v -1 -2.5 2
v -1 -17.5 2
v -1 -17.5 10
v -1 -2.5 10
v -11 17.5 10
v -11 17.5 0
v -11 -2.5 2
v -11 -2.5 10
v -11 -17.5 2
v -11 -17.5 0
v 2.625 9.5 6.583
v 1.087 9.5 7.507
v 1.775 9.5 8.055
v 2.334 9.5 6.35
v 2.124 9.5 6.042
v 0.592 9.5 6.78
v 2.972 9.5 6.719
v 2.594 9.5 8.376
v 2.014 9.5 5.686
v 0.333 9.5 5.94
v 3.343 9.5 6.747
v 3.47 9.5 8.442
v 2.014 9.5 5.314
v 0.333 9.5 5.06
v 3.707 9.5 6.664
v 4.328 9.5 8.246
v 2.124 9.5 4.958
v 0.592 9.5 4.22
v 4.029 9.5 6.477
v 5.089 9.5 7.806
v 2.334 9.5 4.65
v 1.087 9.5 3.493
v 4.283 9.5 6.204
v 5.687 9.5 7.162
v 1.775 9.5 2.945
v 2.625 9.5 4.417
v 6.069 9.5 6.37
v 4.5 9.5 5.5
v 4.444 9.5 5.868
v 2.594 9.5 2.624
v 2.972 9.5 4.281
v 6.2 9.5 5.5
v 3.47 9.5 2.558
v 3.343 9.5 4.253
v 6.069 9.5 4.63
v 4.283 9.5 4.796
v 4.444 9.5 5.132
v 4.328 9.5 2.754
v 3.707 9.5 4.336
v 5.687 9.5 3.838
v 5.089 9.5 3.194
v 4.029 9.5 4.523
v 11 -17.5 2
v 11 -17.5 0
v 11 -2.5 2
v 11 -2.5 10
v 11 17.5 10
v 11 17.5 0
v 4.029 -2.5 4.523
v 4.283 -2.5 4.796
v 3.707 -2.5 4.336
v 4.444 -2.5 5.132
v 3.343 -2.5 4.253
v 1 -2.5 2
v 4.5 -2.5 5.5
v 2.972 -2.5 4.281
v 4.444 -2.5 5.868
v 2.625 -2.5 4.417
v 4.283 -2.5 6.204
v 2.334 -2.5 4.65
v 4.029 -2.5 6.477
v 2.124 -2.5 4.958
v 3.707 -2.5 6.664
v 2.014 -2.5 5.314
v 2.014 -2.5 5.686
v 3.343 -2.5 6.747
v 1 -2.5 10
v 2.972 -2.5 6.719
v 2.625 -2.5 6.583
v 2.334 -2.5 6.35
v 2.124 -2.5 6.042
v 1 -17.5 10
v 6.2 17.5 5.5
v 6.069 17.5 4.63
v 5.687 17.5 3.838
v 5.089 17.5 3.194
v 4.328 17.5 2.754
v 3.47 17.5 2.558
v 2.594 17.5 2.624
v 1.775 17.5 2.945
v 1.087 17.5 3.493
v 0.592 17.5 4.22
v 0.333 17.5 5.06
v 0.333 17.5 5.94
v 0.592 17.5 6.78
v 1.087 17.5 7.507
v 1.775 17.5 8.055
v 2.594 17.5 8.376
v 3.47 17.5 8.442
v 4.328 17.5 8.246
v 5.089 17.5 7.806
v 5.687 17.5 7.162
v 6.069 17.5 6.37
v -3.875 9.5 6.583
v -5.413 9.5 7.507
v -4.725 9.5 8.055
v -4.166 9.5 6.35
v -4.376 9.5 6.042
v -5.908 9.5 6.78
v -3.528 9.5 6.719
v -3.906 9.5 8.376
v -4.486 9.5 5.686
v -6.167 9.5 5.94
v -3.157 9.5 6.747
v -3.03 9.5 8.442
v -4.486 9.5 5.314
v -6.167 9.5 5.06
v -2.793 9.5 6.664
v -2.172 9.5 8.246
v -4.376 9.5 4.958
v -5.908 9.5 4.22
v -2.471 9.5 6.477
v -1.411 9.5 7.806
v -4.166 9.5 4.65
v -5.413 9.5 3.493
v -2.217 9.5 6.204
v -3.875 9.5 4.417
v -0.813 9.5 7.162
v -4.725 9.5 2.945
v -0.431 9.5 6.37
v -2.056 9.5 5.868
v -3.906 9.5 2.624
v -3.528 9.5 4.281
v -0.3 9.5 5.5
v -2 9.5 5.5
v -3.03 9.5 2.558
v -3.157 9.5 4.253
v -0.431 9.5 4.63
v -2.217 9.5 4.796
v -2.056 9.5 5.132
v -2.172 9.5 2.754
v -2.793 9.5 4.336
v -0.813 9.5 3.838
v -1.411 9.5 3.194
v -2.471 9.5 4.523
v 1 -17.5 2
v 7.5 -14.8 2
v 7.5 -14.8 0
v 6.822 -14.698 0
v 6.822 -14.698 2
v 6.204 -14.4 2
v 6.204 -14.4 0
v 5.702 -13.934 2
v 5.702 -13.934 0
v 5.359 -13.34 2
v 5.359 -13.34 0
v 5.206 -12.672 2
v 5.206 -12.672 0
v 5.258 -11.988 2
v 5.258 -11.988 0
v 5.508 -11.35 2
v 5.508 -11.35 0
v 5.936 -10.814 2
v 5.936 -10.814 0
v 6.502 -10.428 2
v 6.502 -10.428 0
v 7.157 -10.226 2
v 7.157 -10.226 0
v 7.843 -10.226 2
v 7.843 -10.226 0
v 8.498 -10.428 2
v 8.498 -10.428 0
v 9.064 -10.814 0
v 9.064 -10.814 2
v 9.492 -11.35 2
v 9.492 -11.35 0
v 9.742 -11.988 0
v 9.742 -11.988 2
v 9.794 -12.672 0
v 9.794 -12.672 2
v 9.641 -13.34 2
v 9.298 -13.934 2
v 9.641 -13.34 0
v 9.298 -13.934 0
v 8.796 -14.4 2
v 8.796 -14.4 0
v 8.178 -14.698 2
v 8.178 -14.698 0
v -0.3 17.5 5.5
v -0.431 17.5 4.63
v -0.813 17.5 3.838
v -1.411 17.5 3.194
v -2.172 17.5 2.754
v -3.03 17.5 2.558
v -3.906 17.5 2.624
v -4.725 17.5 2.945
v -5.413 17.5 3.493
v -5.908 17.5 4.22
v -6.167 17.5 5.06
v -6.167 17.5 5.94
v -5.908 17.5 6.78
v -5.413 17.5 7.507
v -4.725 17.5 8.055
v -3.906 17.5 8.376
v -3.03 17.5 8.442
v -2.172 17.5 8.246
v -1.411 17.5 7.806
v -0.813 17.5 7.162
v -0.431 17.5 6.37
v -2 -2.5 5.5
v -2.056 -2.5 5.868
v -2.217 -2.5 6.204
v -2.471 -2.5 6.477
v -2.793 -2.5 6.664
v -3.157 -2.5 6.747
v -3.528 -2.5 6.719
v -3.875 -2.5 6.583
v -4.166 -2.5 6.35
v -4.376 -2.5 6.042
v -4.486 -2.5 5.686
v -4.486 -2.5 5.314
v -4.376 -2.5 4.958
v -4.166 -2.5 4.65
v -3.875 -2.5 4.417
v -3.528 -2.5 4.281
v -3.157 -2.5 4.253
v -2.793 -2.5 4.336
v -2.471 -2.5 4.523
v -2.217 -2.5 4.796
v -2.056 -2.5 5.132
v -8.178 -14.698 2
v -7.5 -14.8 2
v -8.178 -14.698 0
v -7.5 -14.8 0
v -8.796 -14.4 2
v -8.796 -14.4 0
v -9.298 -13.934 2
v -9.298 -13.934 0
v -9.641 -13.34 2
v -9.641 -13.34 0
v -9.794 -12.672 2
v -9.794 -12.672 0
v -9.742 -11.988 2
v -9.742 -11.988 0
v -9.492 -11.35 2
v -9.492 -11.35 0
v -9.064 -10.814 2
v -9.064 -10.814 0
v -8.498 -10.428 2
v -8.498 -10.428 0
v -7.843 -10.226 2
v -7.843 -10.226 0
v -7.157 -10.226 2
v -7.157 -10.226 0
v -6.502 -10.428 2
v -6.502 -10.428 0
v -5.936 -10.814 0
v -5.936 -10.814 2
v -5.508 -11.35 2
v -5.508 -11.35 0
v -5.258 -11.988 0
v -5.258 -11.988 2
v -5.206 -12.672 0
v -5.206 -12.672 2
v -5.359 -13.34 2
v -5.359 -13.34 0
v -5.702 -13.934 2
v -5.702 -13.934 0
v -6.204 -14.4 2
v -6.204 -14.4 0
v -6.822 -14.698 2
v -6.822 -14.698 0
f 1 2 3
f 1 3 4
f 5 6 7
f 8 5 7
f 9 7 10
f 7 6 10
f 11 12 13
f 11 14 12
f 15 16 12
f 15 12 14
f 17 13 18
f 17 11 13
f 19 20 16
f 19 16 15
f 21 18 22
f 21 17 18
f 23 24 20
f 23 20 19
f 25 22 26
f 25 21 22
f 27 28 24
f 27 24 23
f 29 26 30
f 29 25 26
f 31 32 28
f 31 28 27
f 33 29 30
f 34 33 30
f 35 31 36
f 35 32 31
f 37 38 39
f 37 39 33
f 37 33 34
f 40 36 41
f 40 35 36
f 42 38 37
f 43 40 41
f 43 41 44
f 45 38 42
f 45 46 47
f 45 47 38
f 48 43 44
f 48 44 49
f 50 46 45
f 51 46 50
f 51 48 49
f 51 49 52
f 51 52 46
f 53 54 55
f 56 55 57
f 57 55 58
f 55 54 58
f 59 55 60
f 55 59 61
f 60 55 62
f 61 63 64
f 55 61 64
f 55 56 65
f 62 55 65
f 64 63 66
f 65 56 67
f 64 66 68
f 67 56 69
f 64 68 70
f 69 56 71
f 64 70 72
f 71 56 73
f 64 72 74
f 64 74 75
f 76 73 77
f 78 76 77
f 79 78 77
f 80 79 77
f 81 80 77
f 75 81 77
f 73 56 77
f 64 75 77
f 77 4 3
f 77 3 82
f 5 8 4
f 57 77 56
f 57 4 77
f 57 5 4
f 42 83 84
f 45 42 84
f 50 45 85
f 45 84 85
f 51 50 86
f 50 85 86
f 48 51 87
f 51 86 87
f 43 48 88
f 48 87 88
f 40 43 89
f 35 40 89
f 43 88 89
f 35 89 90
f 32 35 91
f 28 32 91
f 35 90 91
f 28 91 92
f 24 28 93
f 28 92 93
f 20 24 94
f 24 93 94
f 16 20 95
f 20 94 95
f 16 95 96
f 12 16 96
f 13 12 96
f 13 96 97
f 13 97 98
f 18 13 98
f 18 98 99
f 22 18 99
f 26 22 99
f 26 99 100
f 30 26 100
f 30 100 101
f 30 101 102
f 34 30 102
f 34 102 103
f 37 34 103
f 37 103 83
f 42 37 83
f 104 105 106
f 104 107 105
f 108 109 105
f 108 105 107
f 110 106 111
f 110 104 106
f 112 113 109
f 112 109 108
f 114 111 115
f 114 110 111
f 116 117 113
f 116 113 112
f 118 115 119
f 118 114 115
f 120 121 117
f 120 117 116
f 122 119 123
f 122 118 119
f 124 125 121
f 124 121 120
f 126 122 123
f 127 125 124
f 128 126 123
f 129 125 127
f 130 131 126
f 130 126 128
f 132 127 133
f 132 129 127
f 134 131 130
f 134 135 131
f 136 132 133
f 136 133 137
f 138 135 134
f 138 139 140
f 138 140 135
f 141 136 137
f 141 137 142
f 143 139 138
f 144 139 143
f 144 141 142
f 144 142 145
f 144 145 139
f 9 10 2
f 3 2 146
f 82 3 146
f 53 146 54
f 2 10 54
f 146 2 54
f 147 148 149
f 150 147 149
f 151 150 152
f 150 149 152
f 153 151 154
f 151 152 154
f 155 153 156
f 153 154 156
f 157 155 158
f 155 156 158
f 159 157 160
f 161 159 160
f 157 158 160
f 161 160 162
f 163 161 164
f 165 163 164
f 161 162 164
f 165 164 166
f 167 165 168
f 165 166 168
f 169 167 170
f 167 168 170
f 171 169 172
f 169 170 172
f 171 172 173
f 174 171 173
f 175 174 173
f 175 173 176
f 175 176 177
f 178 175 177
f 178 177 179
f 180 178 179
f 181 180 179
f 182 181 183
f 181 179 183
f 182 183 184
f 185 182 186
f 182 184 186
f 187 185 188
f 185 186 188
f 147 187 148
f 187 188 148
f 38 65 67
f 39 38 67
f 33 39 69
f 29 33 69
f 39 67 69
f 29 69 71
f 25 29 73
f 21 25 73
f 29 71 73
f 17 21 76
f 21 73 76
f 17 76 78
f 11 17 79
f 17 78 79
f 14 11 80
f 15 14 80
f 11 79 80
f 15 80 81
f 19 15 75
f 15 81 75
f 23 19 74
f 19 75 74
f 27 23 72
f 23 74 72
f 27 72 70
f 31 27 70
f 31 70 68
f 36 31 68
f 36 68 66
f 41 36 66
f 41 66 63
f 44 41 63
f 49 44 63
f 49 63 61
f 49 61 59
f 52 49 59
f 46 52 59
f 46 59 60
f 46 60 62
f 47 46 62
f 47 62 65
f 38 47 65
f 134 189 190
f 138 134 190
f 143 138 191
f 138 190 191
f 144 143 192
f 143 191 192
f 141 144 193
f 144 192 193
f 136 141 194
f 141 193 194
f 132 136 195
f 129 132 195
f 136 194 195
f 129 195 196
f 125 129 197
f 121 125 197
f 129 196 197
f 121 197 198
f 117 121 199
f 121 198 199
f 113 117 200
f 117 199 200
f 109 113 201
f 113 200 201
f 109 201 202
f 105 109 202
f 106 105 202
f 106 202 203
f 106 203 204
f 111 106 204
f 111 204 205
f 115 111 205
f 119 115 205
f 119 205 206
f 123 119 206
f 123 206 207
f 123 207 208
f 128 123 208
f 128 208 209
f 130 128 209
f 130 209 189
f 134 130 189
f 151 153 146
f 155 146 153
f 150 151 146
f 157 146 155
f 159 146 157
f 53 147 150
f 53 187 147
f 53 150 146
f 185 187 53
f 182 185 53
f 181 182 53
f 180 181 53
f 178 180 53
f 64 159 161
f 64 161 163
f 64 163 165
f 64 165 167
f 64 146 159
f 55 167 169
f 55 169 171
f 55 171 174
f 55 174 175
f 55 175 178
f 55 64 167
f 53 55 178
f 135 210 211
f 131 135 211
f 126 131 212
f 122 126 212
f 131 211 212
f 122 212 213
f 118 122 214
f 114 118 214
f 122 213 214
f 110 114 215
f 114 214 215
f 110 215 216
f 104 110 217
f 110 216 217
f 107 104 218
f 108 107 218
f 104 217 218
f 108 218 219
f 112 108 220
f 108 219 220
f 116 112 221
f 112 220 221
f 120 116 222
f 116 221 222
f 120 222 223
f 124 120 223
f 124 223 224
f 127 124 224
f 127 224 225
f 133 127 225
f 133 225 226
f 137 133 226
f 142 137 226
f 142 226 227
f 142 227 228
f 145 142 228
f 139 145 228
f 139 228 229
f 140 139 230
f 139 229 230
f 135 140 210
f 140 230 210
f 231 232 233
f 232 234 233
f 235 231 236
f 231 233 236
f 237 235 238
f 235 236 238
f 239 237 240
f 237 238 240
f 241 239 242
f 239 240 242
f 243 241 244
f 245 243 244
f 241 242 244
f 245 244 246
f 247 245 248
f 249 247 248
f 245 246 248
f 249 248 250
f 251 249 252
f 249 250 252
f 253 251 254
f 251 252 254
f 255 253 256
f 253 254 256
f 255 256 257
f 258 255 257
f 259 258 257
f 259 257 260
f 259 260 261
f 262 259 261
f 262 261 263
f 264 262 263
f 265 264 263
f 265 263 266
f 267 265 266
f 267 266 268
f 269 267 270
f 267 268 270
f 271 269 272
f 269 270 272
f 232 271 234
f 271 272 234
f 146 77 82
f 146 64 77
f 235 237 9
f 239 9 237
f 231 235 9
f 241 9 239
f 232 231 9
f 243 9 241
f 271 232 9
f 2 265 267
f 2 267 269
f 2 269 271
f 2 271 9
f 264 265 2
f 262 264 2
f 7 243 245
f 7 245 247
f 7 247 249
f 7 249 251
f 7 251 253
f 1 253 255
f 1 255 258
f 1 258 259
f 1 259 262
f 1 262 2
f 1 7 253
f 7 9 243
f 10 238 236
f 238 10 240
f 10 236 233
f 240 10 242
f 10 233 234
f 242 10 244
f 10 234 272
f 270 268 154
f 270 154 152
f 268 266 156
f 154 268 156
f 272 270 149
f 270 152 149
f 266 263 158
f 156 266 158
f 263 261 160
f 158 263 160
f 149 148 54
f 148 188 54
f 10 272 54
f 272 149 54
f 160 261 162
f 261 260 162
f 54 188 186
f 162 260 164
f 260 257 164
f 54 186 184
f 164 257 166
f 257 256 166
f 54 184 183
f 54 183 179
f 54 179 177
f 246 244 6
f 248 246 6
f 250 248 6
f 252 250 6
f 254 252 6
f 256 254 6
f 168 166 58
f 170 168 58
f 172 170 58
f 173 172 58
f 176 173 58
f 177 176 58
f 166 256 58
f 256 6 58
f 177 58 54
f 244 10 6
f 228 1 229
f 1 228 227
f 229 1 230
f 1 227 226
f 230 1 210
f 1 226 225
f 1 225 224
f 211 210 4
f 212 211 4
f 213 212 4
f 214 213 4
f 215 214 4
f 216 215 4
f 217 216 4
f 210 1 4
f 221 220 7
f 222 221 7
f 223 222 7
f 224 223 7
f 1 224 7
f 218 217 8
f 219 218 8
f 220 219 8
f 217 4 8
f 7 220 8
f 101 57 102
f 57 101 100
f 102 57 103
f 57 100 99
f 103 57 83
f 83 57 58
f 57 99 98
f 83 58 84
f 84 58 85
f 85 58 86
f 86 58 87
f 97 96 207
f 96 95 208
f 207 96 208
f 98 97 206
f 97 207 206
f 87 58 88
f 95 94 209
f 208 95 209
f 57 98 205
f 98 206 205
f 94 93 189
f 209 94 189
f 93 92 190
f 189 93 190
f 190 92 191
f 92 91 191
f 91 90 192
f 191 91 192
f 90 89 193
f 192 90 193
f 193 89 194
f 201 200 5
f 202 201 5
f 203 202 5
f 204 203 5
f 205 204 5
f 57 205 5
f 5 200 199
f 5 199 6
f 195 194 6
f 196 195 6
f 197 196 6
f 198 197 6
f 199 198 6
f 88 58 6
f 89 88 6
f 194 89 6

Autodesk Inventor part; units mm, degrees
ref_plane "YZ Plane" through (0, 0, 0) normal (1, 0, 0) x (0, 1, 0)
ref_plane "XZ Plane" through (0, 0, 0) normal (0, 1, 0) x (-1, 0, 0)
ref_plane "XY Plane" through (0, 0, 0) normal (0, 0, 1) x (1, 0, 0)
sketch "Sketch1" plane through (0, 0, 0) normal (0, 0, 1) x (1, 0, 0)
  line L0 (-11, -17.5) -> (11, -17.5)
  line L1 (11, -17.5) -> (11, 17.5)
  line L2 (11, 17.5) -> (-11, 17.5)
  line L3 (-11, 17.5) -> (-11, -17.5)
  line L4 (-11, -17.5) -> (11, 17.5) construction
  line L5 (11, -17.5) -> (-11, 17.5) construction
  point P0 (0, 0)
  dimension "d0" = 22
  dimension "d1" = 35
extrude "Extrusion1" add sketch "Sketch1" along normal blind 10
sketch "Sketch2" plane through (0, 0, 10) normal (0, 0, 1) x (1, 0, 0)
  line L0 (-11, -17.5) -> (19, -17.5)
  line L1 (19, -17.5) -> (19, -2.5)
  line L2 (19, -2.5) -> (-11, -2.5)
  line L3 (-11, -2.5) -> (-11, -17.5)
  point P0 (0, 0)
  dimension "d4" = 30
  dimension "d5" = 15
extrude "Extrusion2" cut sketch "Sketch2" against normal blind 8
sketch "Sketch4" plane through (0, 0, 2) normal (0, 0, 1) x (1, 0, 0)
  circle A0 centre (-7.5, -12.5) radius 2.45
  circle A1 centre (7.5, -12.5) radius 2.45
  line L0 (11, -17.5) -> (-11, -17.5) projected
  point P0 (0, 0)
  dimension "d12" = 4.9
  dimension "d13" = 4.9
  dimension "d14" = 15
  dimension "d15" = 7.5
  dimension "d16" = 5
  dimension "d17" = 5
hole "Hole1" at (-7.5, -12.5, 2) at (7.5, -12.5, 2) direction (0, 0, -1) diameter 4.6 end through all
sketch "Sketch5" plane through (-11, 17.5, 0) normal (0, 1, 0) x (1, 0, 0)
  circle A0 centre (7.75, -5.5) radius 2.95
  circle A1 centre (14.25, -5.5) radius 2.95
  line L0 (22, -10) -> (0, -10) projected
  point P0 (11, 0)
  dimension "d25" = 5.9
  dimension "d26" = 5.9
  dimension "d27" = 6.5
  dimension "d28" = 3.25
  dimension "d29" = 4.5
  dimension "d30" = 4.5
extrude "Extrusion8" cut sketch "Sketch5" against normal blind 8
sketch "Sketch9" plane through (-11, -2.5, 2) normal (0, -1, 0) x (1, 0, 0)
  circle A0 centre (7.75, 3.5) radius 2.95 projected
  circle A1 centre (7.75, 3.5) radius 1.25
  point P0 (11, -2)
  dimension "d45" = 2.5
extrude "Extrusion9" cut sketch "Sketch9" against normal up to next contours A1
sketch "Sketch13" plane through (-11, -2.5, 10) normal (0, -1, 0) x (1, 0, 0)
  circle A0 centre (14.25, -4.5) radius 2.95 projected
  circle A1 centre (14.25, -4.5) radius 1.25
  point P0 (11, -10)
  dimension "d58" = 2.5
extrude "Extrusion13" cut sketch "Sketch13" against normal up to next contours A1
sketch "Sketch14" plane through (0, 0, 2) normal (0, 0, 1) x (1, 0, 0)
  line L0 (-11, -2.5) -> (11, -2.5) projected
  line L1 (-1, -2.5) -> (1, -2.5)
  line L2 (1, -2.5) -> (1, -17.5)
  line L3 (1, -17.5) -> (-1, -17.5)
  line L4 (-1, -17.5) -> (-1, -2.5)
  point P0 (0, 0)
  dimension "d61" = 2
  dimension "d62" = 15
  dimension "d63" = 1
extrude "Extrusion14" add sketch "Sketch14" along normal blind 8
equation "\"d28\" = 0.5 * d27"
equation "\"d30\" = d29"
properties part number "HVcup"
